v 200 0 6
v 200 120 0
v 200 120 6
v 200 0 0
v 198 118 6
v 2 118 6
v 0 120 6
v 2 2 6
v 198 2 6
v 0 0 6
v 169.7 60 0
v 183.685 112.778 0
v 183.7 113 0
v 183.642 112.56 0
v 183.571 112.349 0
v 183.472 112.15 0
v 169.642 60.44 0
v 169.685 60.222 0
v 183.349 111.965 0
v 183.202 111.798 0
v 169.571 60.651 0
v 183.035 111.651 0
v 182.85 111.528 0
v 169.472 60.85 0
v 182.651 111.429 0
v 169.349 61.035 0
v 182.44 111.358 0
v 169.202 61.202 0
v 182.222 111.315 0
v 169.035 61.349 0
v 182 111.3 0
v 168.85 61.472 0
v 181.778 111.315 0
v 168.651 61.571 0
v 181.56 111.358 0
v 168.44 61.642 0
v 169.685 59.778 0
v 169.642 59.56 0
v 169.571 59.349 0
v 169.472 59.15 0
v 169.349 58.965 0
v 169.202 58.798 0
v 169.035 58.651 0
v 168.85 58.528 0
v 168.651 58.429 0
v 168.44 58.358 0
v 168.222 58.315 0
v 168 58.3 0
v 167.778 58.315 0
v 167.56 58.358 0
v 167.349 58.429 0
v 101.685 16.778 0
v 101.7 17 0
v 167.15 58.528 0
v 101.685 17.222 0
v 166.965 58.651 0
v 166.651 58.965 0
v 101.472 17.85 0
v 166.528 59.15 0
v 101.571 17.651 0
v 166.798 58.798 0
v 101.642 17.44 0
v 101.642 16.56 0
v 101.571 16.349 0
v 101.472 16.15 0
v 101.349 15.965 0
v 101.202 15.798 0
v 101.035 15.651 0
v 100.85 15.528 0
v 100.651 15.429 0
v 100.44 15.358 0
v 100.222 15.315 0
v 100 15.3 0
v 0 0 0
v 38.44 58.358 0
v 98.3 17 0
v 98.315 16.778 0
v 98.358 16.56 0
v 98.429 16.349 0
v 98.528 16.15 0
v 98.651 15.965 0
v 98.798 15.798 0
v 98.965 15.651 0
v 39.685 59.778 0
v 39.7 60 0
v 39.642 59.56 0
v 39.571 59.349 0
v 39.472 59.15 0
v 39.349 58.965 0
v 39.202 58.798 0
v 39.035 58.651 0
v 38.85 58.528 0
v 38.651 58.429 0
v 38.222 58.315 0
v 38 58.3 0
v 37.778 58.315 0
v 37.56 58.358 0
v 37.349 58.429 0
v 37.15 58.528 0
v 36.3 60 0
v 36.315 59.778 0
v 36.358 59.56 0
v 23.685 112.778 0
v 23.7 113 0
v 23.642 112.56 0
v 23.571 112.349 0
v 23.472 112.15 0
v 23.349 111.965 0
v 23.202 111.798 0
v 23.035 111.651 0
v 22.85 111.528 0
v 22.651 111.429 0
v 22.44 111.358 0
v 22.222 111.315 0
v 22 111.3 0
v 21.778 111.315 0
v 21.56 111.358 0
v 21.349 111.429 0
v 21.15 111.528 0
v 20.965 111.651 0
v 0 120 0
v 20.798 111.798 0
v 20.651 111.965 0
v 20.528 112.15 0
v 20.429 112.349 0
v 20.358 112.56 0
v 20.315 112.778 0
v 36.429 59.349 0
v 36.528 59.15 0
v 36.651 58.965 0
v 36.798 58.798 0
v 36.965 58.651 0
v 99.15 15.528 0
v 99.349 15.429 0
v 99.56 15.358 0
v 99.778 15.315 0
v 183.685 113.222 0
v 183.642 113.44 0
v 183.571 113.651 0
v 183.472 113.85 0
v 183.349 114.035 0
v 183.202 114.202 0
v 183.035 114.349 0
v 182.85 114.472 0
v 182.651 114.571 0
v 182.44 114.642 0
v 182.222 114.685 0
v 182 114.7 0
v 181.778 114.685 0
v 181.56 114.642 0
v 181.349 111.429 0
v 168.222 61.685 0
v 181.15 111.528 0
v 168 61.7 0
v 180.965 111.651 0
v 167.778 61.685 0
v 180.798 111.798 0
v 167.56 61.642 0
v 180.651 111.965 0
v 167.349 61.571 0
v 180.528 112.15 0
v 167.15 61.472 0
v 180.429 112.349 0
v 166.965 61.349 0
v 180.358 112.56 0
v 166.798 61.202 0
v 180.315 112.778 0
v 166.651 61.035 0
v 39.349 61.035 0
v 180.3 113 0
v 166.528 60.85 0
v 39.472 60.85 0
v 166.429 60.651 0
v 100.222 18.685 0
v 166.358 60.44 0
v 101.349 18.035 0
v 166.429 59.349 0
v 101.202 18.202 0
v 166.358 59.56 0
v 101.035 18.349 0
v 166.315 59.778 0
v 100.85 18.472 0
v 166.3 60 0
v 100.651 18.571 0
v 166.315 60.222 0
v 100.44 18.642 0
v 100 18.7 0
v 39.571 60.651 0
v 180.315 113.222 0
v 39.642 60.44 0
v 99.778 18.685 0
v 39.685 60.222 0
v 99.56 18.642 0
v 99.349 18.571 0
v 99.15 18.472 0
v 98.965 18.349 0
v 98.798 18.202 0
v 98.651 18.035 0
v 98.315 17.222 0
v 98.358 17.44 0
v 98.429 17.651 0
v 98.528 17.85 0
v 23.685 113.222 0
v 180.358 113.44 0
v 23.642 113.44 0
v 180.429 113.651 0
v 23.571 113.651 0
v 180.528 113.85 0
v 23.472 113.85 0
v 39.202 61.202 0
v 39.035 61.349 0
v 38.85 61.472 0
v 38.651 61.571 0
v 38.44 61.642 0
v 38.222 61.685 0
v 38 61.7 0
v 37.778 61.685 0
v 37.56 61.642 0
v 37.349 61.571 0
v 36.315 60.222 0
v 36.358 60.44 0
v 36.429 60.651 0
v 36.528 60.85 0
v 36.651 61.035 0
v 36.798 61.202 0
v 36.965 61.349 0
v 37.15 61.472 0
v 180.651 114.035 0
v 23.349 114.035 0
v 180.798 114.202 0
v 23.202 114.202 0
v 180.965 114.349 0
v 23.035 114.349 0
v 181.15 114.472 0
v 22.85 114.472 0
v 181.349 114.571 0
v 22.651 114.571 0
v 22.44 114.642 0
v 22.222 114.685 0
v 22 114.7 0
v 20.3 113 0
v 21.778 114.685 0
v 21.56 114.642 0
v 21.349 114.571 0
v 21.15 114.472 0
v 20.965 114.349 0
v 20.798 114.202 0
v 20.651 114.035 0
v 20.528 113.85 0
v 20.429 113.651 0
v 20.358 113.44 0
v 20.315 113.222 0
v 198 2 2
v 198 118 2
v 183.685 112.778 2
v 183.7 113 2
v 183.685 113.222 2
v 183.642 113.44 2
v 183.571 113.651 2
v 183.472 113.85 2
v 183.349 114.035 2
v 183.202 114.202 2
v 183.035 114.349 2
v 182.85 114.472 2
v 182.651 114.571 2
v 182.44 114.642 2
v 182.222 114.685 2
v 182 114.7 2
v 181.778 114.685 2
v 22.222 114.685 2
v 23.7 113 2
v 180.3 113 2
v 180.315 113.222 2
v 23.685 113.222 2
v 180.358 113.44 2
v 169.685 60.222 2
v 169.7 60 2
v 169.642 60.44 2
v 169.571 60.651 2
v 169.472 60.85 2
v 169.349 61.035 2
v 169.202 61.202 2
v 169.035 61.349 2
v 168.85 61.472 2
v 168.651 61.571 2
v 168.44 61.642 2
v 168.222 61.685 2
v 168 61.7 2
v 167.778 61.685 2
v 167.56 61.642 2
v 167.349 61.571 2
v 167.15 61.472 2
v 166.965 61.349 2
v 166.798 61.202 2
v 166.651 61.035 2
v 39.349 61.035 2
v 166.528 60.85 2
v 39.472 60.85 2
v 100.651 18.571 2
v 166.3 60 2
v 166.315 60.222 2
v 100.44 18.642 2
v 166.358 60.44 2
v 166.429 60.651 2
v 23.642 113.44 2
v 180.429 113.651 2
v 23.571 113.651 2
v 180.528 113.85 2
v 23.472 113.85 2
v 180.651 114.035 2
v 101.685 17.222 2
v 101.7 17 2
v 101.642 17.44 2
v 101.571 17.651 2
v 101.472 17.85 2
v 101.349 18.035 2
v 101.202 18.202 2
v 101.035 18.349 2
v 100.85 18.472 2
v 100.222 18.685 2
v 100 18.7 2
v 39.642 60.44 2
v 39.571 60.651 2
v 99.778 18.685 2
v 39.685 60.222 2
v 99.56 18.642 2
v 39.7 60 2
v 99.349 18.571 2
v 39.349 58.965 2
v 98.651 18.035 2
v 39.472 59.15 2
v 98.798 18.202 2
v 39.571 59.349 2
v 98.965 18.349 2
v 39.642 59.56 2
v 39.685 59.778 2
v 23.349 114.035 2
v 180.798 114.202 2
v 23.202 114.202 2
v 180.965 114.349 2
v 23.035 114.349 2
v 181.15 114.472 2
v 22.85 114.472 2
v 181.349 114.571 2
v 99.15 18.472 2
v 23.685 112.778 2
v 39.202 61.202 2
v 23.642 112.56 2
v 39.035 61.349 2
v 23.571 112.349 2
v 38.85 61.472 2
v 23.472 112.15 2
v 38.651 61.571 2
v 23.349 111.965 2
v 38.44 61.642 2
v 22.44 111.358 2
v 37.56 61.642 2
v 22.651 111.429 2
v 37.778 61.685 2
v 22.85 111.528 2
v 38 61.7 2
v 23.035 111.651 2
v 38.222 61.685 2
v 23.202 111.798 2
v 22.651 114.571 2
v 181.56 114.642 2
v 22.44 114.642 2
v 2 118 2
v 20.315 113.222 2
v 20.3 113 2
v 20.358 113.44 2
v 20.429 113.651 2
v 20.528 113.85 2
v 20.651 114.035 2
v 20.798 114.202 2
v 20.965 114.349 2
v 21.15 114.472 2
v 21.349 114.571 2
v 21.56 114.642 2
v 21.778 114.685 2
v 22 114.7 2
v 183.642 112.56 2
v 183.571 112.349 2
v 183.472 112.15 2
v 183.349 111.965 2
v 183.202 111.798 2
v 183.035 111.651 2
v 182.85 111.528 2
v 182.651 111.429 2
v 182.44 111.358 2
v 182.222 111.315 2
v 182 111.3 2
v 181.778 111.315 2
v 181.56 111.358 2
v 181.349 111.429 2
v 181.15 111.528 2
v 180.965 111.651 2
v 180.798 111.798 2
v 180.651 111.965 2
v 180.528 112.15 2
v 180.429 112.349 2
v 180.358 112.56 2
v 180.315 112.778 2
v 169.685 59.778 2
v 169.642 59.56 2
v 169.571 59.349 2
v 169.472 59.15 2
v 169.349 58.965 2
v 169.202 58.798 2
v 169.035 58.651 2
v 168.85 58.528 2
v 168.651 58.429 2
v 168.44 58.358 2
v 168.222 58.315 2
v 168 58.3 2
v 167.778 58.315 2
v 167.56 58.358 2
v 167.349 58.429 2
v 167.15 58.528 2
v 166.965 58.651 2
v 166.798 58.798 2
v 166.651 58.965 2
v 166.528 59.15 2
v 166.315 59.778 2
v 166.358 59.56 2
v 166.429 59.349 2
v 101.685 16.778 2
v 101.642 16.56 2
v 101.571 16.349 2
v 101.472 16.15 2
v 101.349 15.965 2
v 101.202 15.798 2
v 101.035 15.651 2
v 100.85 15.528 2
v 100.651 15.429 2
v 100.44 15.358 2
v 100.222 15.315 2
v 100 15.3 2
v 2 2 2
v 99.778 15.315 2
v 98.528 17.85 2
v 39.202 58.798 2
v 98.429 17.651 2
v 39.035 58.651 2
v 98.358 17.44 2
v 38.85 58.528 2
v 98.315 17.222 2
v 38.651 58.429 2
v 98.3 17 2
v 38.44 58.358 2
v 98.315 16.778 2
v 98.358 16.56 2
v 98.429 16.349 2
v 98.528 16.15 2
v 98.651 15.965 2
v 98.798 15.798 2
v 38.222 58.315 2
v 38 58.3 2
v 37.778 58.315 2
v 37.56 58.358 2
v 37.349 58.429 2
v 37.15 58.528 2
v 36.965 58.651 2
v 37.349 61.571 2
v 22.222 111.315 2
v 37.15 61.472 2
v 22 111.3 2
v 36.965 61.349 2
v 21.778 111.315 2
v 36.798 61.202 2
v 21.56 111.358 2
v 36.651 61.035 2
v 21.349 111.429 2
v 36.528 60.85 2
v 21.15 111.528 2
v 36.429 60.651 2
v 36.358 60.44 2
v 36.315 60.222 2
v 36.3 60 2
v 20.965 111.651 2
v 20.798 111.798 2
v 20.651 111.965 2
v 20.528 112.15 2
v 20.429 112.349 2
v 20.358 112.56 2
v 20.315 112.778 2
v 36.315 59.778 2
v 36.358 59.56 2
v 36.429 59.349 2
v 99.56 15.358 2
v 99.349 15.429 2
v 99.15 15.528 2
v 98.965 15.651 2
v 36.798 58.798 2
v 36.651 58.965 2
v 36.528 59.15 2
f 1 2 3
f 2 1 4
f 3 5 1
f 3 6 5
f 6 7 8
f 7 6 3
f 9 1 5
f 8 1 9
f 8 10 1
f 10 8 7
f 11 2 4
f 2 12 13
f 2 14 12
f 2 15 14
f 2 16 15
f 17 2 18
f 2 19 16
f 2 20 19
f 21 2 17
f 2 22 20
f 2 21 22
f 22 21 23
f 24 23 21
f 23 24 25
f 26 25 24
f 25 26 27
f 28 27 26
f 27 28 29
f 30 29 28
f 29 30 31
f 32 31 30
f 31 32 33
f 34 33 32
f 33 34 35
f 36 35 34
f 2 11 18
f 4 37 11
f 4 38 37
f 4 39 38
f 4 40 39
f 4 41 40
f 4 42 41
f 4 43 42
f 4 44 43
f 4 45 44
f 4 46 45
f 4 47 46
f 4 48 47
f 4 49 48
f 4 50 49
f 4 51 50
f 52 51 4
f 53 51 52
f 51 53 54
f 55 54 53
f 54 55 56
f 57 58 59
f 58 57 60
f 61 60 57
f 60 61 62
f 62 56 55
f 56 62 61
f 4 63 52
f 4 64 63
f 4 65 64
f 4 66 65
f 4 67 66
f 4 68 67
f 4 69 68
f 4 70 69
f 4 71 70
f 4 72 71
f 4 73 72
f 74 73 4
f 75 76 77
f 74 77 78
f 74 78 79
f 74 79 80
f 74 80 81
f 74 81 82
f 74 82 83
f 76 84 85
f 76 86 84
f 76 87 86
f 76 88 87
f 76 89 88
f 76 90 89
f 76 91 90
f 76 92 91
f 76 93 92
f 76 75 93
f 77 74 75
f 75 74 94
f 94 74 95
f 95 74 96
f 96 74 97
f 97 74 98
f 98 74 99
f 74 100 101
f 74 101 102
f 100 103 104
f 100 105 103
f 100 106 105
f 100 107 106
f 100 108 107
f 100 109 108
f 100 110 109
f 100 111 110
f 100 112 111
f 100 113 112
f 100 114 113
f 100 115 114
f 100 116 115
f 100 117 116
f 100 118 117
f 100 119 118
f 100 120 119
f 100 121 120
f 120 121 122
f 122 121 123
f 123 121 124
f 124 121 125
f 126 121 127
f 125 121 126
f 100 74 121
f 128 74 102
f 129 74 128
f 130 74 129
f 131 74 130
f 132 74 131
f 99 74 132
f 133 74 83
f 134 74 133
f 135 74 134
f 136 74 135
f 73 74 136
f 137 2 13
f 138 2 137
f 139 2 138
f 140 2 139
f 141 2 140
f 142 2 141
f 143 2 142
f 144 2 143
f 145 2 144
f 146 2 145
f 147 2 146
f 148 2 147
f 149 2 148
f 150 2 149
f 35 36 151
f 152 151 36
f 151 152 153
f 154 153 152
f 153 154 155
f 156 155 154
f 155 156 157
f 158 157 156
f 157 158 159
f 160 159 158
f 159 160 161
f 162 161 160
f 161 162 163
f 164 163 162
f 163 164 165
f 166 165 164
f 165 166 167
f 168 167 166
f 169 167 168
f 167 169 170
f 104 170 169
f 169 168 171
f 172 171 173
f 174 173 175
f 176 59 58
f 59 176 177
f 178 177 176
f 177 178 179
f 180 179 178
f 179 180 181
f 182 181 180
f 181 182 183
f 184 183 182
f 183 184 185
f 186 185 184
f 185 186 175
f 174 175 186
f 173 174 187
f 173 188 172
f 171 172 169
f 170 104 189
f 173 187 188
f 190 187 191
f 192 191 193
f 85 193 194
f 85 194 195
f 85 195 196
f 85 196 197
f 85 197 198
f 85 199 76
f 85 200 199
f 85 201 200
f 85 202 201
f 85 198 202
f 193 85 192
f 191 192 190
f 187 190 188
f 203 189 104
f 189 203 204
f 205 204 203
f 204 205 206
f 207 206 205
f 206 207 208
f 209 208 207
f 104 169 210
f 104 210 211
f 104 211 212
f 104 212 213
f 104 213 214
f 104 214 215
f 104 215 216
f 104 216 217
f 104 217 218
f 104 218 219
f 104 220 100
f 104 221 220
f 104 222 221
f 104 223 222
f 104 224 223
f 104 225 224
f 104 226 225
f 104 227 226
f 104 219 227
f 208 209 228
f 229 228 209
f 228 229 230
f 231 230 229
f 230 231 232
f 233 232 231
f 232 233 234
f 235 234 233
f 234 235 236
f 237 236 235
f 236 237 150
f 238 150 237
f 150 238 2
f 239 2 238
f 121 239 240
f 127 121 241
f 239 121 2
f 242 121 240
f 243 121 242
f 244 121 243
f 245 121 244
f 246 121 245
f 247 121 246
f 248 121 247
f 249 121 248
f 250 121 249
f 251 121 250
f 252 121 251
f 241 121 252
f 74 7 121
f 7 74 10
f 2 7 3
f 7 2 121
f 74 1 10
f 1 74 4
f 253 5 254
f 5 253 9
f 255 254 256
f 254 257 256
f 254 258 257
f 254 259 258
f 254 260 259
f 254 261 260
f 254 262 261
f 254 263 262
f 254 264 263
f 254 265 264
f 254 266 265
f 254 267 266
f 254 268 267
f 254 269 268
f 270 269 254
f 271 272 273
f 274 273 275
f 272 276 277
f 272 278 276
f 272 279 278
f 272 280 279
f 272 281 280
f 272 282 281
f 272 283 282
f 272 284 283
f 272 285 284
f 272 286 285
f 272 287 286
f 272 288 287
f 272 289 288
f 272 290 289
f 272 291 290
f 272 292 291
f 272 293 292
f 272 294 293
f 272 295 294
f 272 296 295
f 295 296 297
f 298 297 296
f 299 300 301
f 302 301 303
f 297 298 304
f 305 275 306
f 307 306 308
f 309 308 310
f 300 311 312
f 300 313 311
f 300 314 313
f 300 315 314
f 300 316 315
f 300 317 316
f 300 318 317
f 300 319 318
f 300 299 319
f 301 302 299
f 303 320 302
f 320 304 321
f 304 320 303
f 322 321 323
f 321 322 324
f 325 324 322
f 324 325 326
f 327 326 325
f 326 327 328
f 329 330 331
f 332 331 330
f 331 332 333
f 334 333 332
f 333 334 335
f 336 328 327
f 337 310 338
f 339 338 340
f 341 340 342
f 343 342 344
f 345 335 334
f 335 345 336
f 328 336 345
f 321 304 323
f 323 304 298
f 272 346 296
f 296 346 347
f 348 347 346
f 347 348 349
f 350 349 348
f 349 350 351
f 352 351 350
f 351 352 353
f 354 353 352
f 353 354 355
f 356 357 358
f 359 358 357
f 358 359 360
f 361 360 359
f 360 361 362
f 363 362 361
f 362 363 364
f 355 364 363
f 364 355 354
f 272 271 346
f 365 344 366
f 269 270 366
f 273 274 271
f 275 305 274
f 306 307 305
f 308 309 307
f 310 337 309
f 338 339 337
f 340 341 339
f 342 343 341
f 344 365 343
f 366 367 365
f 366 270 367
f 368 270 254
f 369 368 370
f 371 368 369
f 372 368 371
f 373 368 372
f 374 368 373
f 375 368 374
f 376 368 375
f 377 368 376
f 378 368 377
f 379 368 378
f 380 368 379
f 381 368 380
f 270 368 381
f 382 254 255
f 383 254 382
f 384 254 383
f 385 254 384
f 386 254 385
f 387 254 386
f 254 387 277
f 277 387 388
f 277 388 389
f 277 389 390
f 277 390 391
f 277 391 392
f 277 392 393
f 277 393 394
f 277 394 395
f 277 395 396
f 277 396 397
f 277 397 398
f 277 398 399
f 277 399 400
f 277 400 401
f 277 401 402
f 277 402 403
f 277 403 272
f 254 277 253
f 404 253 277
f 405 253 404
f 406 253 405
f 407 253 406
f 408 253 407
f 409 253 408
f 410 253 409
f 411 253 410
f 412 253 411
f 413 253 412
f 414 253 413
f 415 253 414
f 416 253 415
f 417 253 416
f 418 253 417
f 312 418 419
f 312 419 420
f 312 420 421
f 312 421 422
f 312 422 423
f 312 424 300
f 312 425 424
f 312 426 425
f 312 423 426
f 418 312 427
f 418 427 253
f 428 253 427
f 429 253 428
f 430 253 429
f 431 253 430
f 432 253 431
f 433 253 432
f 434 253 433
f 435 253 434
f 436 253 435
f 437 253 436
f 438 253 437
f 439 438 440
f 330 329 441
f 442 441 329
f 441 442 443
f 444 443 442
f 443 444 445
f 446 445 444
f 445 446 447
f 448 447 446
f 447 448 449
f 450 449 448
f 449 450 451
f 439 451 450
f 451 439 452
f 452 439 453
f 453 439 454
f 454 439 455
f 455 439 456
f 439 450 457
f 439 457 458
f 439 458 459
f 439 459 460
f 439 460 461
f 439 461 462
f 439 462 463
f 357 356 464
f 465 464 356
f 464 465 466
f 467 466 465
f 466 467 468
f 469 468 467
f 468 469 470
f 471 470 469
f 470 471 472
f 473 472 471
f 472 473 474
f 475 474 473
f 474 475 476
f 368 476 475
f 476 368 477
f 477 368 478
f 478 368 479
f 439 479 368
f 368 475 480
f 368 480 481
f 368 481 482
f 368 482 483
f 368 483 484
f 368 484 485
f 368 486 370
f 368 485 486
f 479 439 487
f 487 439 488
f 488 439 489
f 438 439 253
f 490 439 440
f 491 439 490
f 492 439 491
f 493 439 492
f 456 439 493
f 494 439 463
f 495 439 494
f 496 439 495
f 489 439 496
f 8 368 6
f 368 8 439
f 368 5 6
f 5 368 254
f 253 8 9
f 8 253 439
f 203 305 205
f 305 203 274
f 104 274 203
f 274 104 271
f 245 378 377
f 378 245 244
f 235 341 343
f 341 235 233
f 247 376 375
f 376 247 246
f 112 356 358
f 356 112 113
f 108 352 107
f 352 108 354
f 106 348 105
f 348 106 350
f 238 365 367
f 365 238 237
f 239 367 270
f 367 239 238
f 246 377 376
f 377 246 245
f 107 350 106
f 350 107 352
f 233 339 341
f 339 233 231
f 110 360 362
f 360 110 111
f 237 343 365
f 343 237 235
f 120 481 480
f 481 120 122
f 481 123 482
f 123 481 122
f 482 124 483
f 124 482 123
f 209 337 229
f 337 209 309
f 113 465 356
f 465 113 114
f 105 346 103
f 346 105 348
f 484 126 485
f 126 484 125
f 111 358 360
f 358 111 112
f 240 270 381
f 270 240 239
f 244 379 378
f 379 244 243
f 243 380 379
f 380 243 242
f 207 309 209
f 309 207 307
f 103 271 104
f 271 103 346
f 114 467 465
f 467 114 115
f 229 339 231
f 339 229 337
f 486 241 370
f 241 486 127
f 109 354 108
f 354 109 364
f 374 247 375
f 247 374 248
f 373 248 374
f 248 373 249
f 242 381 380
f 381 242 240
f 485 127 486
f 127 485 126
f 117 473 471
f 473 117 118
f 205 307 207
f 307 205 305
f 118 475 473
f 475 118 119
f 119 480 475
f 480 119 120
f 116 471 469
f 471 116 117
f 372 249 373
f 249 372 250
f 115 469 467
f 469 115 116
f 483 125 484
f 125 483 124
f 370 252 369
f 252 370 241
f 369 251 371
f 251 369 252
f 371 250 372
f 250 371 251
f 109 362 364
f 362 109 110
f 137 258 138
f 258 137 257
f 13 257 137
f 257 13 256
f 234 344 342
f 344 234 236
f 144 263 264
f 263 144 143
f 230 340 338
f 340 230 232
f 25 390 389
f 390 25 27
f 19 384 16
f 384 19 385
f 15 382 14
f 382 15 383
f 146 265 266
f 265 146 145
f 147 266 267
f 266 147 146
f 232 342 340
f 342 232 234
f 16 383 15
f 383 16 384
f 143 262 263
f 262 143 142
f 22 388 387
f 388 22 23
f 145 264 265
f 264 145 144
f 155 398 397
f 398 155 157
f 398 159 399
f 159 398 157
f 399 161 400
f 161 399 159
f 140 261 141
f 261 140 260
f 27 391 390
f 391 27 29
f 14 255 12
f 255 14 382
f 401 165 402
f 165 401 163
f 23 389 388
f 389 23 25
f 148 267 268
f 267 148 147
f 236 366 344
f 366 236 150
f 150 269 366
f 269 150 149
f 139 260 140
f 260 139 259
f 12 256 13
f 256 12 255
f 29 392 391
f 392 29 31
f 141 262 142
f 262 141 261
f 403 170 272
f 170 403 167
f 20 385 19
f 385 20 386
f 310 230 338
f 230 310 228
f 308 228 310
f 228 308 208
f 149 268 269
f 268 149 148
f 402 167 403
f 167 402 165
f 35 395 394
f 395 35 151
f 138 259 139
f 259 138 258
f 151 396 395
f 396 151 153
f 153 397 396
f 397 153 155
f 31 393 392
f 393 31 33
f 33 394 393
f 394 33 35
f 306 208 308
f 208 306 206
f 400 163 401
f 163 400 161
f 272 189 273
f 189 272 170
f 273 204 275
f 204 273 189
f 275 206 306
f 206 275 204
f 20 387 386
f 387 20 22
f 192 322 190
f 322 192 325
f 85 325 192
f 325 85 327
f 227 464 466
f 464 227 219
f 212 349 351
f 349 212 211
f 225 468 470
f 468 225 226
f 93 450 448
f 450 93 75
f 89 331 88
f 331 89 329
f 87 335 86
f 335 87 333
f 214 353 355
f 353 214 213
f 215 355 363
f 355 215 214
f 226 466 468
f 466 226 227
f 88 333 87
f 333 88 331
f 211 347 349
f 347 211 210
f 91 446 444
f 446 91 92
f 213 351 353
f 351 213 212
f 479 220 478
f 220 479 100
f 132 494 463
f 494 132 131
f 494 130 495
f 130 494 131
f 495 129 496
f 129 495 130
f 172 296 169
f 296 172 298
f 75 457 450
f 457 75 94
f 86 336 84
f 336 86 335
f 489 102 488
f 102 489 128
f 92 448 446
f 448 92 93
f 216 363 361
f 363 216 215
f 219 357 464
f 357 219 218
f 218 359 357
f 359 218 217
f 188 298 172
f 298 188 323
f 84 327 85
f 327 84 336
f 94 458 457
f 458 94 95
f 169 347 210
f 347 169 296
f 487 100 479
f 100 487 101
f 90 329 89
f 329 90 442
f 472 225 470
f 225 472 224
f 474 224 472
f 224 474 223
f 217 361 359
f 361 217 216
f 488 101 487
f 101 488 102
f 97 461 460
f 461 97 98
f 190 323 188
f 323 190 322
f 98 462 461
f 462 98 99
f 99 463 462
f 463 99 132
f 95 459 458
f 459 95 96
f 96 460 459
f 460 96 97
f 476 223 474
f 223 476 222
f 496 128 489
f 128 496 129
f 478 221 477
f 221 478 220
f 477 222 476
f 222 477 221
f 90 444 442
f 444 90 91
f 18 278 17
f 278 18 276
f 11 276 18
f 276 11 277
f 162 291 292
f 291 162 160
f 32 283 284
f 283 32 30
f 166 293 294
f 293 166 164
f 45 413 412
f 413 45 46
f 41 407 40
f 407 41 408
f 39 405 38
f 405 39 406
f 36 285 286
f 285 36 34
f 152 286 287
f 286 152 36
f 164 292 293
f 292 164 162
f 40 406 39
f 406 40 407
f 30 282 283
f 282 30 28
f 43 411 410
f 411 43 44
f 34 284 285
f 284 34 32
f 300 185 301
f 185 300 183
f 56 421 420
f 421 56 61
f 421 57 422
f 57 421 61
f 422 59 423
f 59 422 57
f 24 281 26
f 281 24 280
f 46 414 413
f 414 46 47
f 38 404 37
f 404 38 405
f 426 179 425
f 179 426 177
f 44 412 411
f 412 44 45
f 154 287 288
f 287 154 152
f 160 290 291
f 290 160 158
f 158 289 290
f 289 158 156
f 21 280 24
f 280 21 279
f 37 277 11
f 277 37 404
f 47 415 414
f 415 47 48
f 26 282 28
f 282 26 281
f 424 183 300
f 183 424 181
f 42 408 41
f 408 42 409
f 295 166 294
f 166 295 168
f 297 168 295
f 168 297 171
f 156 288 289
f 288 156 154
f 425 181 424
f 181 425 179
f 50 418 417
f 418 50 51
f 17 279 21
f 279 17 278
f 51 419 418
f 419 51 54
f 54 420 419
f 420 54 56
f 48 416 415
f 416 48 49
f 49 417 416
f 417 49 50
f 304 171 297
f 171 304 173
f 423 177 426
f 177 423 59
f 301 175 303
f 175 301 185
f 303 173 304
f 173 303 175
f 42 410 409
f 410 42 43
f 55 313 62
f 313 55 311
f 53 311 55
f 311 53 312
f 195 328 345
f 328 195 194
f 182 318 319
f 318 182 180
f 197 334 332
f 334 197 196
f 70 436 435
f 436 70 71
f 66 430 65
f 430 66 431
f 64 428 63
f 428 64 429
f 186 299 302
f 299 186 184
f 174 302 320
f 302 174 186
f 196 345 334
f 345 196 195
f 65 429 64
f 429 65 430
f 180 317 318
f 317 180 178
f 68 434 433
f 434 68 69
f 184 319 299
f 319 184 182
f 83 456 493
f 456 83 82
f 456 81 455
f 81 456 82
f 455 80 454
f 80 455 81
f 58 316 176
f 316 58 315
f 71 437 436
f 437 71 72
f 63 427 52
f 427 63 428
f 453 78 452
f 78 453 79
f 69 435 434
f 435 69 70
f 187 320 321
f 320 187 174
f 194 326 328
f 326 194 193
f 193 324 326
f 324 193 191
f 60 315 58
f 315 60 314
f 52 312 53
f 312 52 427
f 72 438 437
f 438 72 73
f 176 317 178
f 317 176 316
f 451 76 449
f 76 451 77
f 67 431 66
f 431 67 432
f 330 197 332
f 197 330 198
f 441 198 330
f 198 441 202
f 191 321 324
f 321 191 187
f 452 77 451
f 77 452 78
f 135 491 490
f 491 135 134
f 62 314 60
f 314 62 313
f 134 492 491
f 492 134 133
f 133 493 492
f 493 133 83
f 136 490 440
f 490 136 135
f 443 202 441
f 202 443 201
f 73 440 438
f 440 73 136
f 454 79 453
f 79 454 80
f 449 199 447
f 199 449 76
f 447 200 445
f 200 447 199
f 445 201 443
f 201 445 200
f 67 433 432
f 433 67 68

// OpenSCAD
// Desk Organizer — Portacosas
// Parametric modular desk organizer with snap-fit tray system
// render_mode selects part: 0=tray_base, 1=pen_holder, 2=phone_stand,
//                           3=card_slot, 4=cable_clip, 5=label_plate

// --- Parameters ---
render_mode = 0;

// Tray dimensions
tray_width = 200;
tray_depth = 120;
wall_height = 80;
wall_thickness = 2.0;

// Pen holder
pen_count = 5;
pen_diameter = 12;
pen_style = false; // false=round, true=hex

// Phone stand
phone_width = 75;
phone_angle = 65;
charging_slot = true;

// Card slot
card_width = 90;
card_depth = 60;
card_angle = 10;

// Cable clip
clip_count = 2;
clip_diameter = 6;

// Personalization
label_text = "YANTRA4D";
label_depth = 0.5;

// Grid (used by grid.scad)
rows = 1;
cols = 1;

// Resolution
$fn = 48;

// Set by a file that INCLUDES this one, to suppress this file's own top-level
// render. grid.scad includes desk_organizer.scad for its modules; without the
// guard this file's selector also fires and draws a stray tray_base() at the
// origin on top of the grid. (assembly.scad uses `use`, which never runs a
// top-level render, so the guard is belt-and-braces there.)
//
// The includer sets `desk_organizer_as_library`, a name this file never assigns:
// with `include`, OpenSCAD resolves a variable to its LAST assignment in the
// flattened file, so a plain `is_library = false` here would silently overwrite
// the includer's `true` (and emit an "was overwritten" warning). Reading a name
// this file does not own avoids the collision entirely.
is_library = !is_undef(desk_organizer_as_library) && desk_organizer_as_library;

// --- Derived ---
snap_size = 3;        // snap-fit nub size
snap_tol = 0.2;       // snap-fit tolerance
base_h = wall_thickness;  // tray floor thickness
pen_holder_w = pen_count * (pen_diameter + wall_thickness) + wall_thickness;
pen_holder_d = pen_diameter + wall_thickness * 2;

// --- Snap-fit socket/nub helpers ---
// The nub is built pointing DOWN (-Z) directly, by tapering d1->d2 over a
// translate, instead of `mirror([0,0,1]) snap_nub()` at the caller. mirror()
// reverses face winding, and every component ended with one — the inverted
// shells the render sweep reported. It also let the nub meet its parent on a
// zero-thickness plane at z=0; the nub now overlaps its parent by snap_bite so
// the union is volumetric and the result is a single watertight body.
snap_bite = 0.4;   // overlap into the parent, so nub and body fuse

module snap_nub(h=snap_size) {
    // Downward nub: wide end at z=+snap_bite (inside the parent), narrow end at
    // z=-h. Positive winding throughout — no mirror().
    translate([0, 0, -h])
        cylinder(d1=snap_size*0.6, d2=snap_size, h=h + snap_bite);
}

module snap_socket(h=snap_size) {
    cylinder(d=snap_size + snap_tol*2, h=h+0.1);
}

// --- Tray Base ---
module tray_base(tray_width=tray_width, tray_depth=tray_depth,
                 wall_thickness=wall_thickness, clip_count=clip_count) {
    base_h = wall_thickness;
    pen_holder_w = pen_count * (pen_diameter + wall_thickness) + wall_thickness;
    difference() {
        union() {
            // Floor plate
            cube([tray_width, tray_depth, base_h]);
            // Low perimeter lip
            difference() {
                cube([tray_width, tray_depth, base_h + 4]);
                translate([wall_thickness, wall_thickness, base_h])
                    cube([tray_width - wall_thickness*2,
                          tray_depth - wall_thickness*2,
                          5]);
            }
        }
        // Snap-fit sockets for components
        // Pen holder socket — left side
        translate([wall_thickness + pen_holder_w/2,
                   tray_depth/2, -0.05])
            snap_socket(base_h + 0.1);
        // Phone stand socket — right side
        translate([tray_width - wall_thickness - 30,
                   tray_depth/2, -0.05])
            snap_socket(base_h + 0.1);
        // Card slot socket — front center
        translate([tray_width/2,
                   wall_thickness + 15, -0.05])
            snap_socket(base_h + 0.1);
        // Cable clip sockets — back edge
        for (i = [0 : clip_count - 1]) {
            translate([wall_thickness + 20 + i * (tray_width - 40) / max(clip_count - 1, 1),
                       tray_depth - wall_thickness - 5, -0.05])
                snap_socket(base_h + 0.1);
        }
    }
}

// --- Pen Holder ---
module pen_holder(pen_count=pen_count, pen_diameter=pen_diameter,
                  pen_style=pen_style, wall_thickness=wall_thickness,
                  wall_height=wall_height) {
    holder_h = wall_height * 0.7;
    pen_holder_w = pen_count * (pen_diameter + wall_thickness) + wall_thickness;
    pen_holder_d = pen_diameter + wall_thickness * 2;
    union() {
    difference() {
        // Outer shell
        if (pen_style) {
            // Hex grid container
            cube([pen_holder_w, pen_holder_d, holder_h]);
        } else {
            cube([pen_holder_w, pen_holder_d, holder_h]);
        }
        // Pen bores
        for (i = [0 : pen_count - 1]) {
            px = wall_thickness + pen_diameter/2 + i * (pen_diameter + wall_thickness);
            py = pen_holder_d / 2;
            translate([px, py, wall_thickness]) {
                if (pen_style) {
                    // Hexagonal bore
                    cylinder(d=pen_diameter, h=holder_h, $fn=6);
                } else {
                    cylinder(d=pen_diameter, h=holder_h);
                }
            }
        }
    }
    // Snap nub on bottom (built downward; see snap_nub)
    translate([pen_holder_w/2, pen_holder_d/2, 0])
        snap_nub();
    }
}

// --- Phone Stand ---
module phone_stand(phone_width=phone_width, wall_height=wall_height,
                   wall_thickness=wall_thickness, charging_slot=charging_slot) {
    stand_d = 40;
    stand_h = wall_height * 0.8;
    lip_h = 10;

    union() {
    difference() {
        union() {
            // Back angled support — hull for smooth cradle
            hull() {
                cube([phone_width, wall_thickness, stand_h]);
                translate([0, stand_d, 0])
                    cube([phone_width, wall_thickness, lip_h]);
            }
            // Bottom platform
            cube([phone_width, stand_d + wall_thickness, wall_thickness]);
            // Front lip
            translate([0, stand_d, 0])
                cube([phone_width, wall_thickness, lip_h]);
        }
        // Charging slot cutout
        if (charging_slot) {
            slot_w = 25;
            slot_h = 8;
            translate([(phone_width - slot_w)/2, -0.1, wall_thickness])
                cube([slot_w, wall_thickness + 0.2, slot_h]);
            translate([(phone_width - slot_w)/2, -0.1, wall_thickness])
                cube([slot_w, stand_d * 0.3, slot_h]);
        }
    }
    // Snap nub on bottom center (built downward; see snap_nub)
    translate([phone_width/2, stand_d/2, 0])
        snap_nub();
    }
}

// --- Card Slot ---
module card_slot(card_width=card_width, card_depth=card_depth,
                 wall_height=wall_height, wall_thickness=wall_thickness) {
    slot_h = wall_height * 0.4;
    union() {
    difference() {
        // Angled pocket
        hull() {
            cube([card_width, wall_thickness, slot_h]);
            translate([0, card_depth, 0])
                cube([card_width, wall_thickness, slot_h * 0.3]);
        }
        // Interior cutout
        translate([wall_thickness, wall_thickness, wall_thickness])
            hull() {
                cube([card_width - wall_thickness*2, 0.1, slot_h - wall_thickness]);
                translate([0, card_depth - wall_thickness, 0])
                    cube([card_width - wall_thickness*2, 0.1,
                          slot_h * 0.3 - wall_thickness]);
            }
    }
    // Bottom platform — inside the union(); it used to be a third top-level
    // sibling, so the part exported as disjoint shells rather than one solid.
    cube([card_width, card_depth + wall_thickness, wall_thickness]);
    // Snap nub (built downward; see snap_nub)
    translate([card_width/2, card_depth/2, 0])
        snap_nub();
    }
}

// --- Cable Clip ---
module cable_clip(clip_diameter=clip_diameter, wall_thickness=wall_thickness) {
    clip_h = 15;
    clip_w = clip_diameter + wall_thickness * 2;
    gap = clip_diameter * 0.4; // opening gap

    union() {
    difference() {
        cylinder(d=clip_w, h=clip_h);
        // Cable bore
        translate([0, 0, wall_thickness])
            cylinder(d=clip_diameter, h=clip_h);
        // C-shaped opening
        translate([0, clip_w/2, wall_thickness + clip_h * 0.3])
            cube([gap, clip_w, clip_h], center=true);
    }
    // Base pad
    translate([-clip_w/2, -clip_w/2, 0])
        cube([clip_w, clip_w, wall_thickness]);
    // Snap nub (built downward; see snap_nub)
    snap_nub();
    }
}

// --- Label Plate ---
module label_plate(tray_width=tray_width, wall_thickness=wall_thickness,
                   label_text=label_text, label_depth=label_depth) {
    plate_w = tray_width * 0.4;
    plate_h = 12;
    plate_d = wall_thickness;

    difference() {
        cube([plate_w, plate_d, plate_h]);
        // Embossed text
        translate([plate_w/2, -0.01, plate_h/2])
            rotate([90, 0, 180])
                linear_extrude(height=label_depth + 0.01)
                    text(label_text, size=plate_h * 0.6,
                         halign="center", valign="center",
                         font="Liberation Sans:style=Bold");
    }
}

// --- Render Selector: one branch per declared part ---
// Suppressed when another file includes this one for its modules.
if (!is_library) {
    if (render_mode == 0) tray_base();
    else if (render_mode == 1) pen_holder();
    else if (render_mode == 2) phone_stand();
    else if (render_mode == 3) card_slot();
    else if (render_mode == 4) cable_clip();
    else if (render_mode == 5) label_plate();
}
